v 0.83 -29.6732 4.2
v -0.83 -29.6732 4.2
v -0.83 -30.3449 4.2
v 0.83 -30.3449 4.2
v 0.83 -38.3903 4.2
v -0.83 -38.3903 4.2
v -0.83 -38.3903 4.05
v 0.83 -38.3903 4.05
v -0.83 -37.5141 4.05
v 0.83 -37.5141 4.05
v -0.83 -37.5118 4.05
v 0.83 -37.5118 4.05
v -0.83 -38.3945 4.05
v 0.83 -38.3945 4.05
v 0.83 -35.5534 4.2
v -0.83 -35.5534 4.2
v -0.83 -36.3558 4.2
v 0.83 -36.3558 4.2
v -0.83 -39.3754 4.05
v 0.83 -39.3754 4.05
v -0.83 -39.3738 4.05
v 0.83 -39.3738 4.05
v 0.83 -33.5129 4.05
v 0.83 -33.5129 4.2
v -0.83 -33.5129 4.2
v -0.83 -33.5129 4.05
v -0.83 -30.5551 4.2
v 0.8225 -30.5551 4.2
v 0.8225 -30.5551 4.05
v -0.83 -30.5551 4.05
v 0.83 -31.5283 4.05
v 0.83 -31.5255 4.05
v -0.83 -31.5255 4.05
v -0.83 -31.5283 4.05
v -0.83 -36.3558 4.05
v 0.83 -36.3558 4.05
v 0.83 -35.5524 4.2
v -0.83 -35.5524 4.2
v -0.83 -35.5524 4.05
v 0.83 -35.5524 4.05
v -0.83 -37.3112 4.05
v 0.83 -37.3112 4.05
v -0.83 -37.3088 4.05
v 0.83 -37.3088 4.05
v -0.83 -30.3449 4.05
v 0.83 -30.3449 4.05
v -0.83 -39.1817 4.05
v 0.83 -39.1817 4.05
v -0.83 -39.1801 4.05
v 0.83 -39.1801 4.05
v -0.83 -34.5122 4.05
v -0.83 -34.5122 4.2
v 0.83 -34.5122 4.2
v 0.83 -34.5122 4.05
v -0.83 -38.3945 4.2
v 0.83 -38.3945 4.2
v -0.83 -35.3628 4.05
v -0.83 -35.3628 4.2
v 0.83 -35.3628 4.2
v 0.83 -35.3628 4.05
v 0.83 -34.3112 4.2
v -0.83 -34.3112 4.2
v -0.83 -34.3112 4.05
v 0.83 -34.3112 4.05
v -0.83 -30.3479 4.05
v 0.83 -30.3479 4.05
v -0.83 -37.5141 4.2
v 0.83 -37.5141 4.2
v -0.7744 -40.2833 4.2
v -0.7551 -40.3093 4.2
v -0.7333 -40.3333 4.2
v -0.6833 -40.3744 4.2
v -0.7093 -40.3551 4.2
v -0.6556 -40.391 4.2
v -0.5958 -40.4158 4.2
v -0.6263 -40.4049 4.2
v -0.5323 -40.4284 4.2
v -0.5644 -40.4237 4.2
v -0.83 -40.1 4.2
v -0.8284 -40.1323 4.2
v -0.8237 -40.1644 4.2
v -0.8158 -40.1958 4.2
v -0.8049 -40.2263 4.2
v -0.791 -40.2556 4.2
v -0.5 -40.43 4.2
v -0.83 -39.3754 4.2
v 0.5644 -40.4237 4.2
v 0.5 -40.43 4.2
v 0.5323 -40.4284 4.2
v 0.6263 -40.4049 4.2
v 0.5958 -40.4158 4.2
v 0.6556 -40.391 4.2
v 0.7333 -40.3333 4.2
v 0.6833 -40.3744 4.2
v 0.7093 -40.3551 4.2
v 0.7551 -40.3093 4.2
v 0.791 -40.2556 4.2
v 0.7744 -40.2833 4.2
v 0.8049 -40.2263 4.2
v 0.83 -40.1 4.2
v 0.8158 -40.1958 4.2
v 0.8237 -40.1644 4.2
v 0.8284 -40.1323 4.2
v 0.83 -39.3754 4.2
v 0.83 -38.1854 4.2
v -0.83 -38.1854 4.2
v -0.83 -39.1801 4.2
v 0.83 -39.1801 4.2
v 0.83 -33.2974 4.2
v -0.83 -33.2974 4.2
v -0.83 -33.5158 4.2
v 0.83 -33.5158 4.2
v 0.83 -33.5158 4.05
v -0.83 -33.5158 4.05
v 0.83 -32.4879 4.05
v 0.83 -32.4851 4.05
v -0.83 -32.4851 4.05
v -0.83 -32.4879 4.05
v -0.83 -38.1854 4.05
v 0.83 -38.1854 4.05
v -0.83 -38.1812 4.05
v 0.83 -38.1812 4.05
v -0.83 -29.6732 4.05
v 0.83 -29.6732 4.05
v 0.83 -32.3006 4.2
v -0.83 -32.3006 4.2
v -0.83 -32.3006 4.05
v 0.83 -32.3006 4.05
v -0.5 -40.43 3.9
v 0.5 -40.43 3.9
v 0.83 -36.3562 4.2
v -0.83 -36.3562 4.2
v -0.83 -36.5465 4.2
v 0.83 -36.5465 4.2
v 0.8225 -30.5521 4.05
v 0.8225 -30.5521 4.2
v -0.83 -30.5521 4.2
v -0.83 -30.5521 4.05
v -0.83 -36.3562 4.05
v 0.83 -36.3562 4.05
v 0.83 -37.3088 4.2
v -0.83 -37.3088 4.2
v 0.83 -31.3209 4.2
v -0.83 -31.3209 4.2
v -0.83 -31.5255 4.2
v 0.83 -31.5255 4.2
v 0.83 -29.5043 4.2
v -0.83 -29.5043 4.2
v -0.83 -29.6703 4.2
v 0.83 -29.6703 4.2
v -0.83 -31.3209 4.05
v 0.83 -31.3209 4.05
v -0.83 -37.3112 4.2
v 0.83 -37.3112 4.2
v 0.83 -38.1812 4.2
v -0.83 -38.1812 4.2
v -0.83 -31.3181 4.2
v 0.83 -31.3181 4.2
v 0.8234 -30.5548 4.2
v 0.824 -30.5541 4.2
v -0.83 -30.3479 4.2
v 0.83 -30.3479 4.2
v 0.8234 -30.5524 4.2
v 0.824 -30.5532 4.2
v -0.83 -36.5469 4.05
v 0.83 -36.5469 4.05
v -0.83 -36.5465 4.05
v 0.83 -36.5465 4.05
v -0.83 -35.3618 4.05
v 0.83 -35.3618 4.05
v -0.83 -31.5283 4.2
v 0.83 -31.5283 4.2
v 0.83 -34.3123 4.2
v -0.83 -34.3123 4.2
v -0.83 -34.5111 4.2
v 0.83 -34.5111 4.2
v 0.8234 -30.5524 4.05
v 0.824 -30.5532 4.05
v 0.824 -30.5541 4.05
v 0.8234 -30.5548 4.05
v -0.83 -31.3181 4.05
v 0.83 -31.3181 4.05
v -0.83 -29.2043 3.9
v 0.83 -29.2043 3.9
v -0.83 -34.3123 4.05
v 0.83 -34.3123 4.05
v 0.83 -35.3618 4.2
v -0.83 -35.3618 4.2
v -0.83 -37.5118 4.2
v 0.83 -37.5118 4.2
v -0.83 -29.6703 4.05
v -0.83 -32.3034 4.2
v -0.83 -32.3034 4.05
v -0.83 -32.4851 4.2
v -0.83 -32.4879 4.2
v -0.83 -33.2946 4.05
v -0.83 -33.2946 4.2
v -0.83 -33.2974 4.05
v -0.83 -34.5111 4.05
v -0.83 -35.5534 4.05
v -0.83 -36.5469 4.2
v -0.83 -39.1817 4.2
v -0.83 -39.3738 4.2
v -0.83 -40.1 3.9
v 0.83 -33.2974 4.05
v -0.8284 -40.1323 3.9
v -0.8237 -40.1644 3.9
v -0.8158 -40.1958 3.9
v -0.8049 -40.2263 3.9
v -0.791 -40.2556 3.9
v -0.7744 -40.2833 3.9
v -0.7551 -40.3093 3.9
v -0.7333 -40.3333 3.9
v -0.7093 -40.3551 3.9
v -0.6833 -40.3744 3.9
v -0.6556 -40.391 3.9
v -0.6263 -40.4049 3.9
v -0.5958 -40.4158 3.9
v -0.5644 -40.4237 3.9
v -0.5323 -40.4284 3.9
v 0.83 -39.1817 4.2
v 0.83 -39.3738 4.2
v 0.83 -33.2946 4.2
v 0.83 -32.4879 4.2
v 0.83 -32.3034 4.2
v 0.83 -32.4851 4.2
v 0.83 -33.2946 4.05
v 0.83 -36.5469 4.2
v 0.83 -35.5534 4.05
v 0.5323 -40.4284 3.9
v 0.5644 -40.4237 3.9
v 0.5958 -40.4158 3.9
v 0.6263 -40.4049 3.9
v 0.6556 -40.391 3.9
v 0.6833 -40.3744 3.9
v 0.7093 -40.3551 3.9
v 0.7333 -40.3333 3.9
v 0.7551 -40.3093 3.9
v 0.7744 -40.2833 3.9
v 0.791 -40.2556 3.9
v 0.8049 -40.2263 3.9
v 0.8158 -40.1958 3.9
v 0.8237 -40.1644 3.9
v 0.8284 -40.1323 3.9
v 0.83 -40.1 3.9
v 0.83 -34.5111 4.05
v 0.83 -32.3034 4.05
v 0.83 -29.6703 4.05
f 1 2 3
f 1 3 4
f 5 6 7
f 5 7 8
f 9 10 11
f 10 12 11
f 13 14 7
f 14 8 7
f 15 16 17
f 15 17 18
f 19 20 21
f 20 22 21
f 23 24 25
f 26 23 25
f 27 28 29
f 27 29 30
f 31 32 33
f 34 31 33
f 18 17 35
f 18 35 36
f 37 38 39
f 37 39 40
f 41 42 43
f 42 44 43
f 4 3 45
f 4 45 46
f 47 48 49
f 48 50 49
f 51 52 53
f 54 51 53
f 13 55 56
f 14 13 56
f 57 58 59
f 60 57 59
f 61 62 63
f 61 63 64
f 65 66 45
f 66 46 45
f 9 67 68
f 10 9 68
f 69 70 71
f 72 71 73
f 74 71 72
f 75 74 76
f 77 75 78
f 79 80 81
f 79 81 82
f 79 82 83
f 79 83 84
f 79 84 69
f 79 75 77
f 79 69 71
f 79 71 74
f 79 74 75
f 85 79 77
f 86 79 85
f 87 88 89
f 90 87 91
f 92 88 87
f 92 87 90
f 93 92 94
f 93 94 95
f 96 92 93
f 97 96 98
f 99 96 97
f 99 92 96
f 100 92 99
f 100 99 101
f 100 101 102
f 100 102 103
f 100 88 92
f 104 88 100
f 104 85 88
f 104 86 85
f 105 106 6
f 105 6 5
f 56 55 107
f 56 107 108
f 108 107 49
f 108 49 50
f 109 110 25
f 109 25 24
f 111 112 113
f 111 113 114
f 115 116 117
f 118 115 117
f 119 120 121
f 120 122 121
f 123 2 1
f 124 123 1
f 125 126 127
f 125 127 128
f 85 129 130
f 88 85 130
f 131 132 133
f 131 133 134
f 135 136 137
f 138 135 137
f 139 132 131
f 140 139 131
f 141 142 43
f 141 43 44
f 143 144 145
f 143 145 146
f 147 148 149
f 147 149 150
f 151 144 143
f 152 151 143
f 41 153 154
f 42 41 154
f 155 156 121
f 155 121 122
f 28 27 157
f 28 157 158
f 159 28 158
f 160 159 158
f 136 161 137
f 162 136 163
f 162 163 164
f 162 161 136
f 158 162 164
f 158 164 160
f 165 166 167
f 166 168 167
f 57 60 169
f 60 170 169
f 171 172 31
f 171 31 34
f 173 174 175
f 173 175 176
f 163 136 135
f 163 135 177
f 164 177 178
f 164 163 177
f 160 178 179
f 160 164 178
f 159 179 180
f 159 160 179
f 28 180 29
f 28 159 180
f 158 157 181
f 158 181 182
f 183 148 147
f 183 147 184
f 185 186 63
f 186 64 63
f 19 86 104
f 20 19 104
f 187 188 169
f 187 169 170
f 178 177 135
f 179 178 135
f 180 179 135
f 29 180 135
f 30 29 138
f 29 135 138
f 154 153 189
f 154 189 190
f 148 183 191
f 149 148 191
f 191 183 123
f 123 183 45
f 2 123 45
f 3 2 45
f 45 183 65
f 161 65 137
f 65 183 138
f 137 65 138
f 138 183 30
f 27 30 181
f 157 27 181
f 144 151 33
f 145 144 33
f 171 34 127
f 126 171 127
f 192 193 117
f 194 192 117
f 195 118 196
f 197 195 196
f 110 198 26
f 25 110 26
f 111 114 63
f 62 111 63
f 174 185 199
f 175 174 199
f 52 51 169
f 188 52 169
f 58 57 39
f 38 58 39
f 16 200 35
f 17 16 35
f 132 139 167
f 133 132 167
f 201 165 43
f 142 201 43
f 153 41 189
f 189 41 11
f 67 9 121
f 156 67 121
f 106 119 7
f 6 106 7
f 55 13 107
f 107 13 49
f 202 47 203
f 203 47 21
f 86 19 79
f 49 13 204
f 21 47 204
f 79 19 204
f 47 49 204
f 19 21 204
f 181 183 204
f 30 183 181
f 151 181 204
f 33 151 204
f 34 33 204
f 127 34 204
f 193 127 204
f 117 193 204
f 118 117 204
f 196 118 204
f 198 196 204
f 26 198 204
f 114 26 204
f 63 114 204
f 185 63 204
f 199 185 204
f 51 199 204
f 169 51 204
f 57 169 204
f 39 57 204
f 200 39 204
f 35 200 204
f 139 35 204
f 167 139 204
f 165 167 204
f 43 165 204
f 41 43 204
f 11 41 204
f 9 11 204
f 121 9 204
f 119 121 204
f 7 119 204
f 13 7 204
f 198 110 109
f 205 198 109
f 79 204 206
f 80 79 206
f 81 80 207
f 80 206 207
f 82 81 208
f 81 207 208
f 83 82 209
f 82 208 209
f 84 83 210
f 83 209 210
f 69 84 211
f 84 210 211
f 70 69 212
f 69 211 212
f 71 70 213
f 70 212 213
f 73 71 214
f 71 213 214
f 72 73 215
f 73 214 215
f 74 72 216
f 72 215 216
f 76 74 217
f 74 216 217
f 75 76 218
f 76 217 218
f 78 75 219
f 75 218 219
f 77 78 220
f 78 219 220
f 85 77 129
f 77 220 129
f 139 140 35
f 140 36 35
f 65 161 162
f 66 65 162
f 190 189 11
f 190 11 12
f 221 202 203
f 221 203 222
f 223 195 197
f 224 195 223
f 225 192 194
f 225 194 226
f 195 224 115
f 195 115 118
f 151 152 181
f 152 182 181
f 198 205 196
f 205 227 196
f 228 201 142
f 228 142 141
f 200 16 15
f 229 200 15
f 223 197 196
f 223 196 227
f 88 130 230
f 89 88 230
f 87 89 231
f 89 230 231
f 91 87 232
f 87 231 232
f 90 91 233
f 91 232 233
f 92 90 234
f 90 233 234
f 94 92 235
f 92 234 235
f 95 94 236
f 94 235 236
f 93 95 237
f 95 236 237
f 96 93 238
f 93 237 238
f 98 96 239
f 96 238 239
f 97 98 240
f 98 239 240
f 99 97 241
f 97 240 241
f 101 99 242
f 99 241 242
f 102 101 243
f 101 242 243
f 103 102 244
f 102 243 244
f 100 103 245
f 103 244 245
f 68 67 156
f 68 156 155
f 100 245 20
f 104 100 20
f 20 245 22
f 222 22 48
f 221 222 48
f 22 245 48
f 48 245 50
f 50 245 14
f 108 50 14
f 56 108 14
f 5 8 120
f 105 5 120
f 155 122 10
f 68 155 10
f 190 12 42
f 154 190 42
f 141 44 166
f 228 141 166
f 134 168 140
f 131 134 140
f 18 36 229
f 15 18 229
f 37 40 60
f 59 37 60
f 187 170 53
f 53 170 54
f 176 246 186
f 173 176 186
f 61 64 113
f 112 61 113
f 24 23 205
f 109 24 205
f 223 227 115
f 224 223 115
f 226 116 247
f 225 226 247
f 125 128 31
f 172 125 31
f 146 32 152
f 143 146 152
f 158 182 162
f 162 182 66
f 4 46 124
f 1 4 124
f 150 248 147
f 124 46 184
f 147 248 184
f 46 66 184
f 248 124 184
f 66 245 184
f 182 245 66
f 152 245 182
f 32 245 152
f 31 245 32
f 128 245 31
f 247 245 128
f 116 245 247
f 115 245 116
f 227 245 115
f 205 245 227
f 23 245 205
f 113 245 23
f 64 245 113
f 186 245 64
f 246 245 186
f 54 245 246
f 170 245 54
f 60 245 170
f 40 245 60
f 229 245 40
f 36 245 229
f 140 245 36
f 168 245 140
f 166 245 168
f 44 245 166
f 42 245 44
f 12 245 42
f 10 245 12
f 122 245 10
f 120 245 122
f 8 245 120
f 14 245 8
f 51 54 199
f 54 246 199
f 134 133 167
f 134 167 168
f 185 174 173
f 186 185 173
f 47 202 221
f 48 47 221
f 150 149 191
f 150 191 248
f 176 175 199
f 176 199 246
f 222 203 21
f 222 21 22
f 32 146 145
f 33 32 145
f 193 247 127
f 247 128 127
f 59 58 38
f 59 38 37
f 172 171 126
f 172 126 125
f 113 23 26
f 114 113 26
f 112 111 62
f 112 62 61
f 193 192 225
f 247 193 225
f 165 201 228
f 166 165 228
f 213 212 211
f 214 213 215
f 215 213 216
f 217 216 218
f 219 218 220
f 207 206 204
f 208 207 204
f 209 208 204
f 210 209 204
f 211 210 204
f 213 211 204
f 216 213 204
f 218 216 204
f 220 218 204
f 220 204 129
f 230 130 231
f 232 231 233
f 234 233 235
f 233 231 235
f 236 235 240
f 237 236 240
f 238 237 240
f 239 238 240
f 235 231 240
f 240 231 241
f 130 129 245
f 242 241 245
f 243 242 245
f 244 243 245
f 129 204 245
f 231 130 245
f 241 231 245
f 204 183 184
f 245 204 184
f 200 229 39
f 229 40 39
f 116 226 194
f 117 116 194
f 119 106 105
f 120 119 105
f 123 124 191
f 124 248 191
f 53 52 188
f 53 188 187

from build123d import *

# Parameters (mm, degrees)
PAD005_DEPTH    = 0.3
POCKET019_DEPTH = 5
POCKET021_DEPTH = 0.15


with BuildPart() as part:
    # Sketch022 (on Face1 of Binder004) → Pad005 (new body)
    with BuildSketch(Plane.XY.offset(3.9)):
        with BuildLine():
            Line((-0.83, -29.124264), (-0.83, -40.1))
            ThreePointArc((-0.83, -40.1), (-0.733345, -40.333345), (-0.5, -40.43))
            Line((-0.5, -40.43), (0.5, -40.43))
            ThreePointArc((0.5, -40.43), (0.733345, -40.333345), (0.83, -40.1))
            Line((0.83, -40.1), (0.83, -29.124264))
            Line((0.83, -29.124264), (-0.83, -29.124264))
        make_face()
    extrude(amount=PAD005_DEPTH)

    # Sketch023 (on Face1 of Pad005) → Pocket019 (cut)
    with BuildSketch(Plane(origin=(-0.83, 0, 0), x_dir=(0, -1, 0), z_dir=(-1, 0, 0))):
        Polygon((29.124264, 4.2), (29.504264, 4.2), (29.204264, 3.9), (29.124264, 3.9), align=None)
    extrude(amount=-POCKET019_DEPTH, mode=Mode.SUBTRACT)

    # Sketch025 (on Face4 of Pocket019) → Pocket021 (cut)
    with BuildSketch(Plane.XY.offset(4.2)):
        with BuildLine():
            ThreePointArc((-0.83, -29.67322), (-0.831482, -29.671738), (-0.83, -29.670256))
            Line((-0.83, -29.670256), (-0.276667, -29.670256))
            Line((-0.276667, -29.670256), (0.83, -29.670256))
            ThreePointArc((0.83, -29.670256), (0.831482, -29.671738), (0.83, -29.67322))
            Line((-0.276667, -29.67322), (0.83, -29.67322))
            Line((-0.83, -29.67322), (-0.276667, -29.67322))
        make_face()
        with BuildLine():
            ThreePointArc((0.822545, -30.552135), (0.824027, -30.553617), (0.822545, -30.555099))
            Line((0.822545, -30.555099), (0.271697, -30.555099))
            Line((0.271697, -30.555099), (-0.83, -30.555099))
            ThreePointArc((-0.83, -30.555099), (-0.831482, -30.553617), (-0.83, -30.552135))
            Line((0.271697, -30.552135), (-0.83, -30.552135))
            Line((0.822545, -30.552135), (0.271697, -30.552135))
        make_face()
        with BuildLine():
            ThreePointArc((-0.83, -30.347855), (-0.831482, -30.346373), (-0.83, -30.344891))
            Line((-0.83, -30.344891), (-0.276667, -30.344891))
            Line((-0.276667, -30.344891), (0.83, -30.344891))
            ThreePointArc((0.83, -30.344891), (0.831482, -30.346373), (0.83, -30.347855))
            Line((-0.276667, -30.347855), (0.83, -30.347855))
            Line((-0.83, -30.347855), (-0.276667, -30.347855))
        make_face()
        with BuildLine():
            ThreePointArc((-0.83, -31.320874), (-0.831408, -31.319466), (-0.83, -31.318058))
            Line((-0.83, -31.318058), (-0.276667, -31.318058))
            Line((-0.276667, -31.318058), (0.83, -31.318058))
            ThreePointArc((0.83, -31.318058), (0.831408, -31.319466), (0.83, -31.320874))
            Line((-0.276667, -31.320874), (0.83, -31.320874))
            Line((-0.83, -31.320874), (-0.276667, -31.320874))
        make_face()
        with BuildLine():
            ThreePointArc((0.83, -33.512935), (0.831408, -33.514343), (0.83, -33.515751))
            Line((0.83, -33.515751), (0.276667, -33.515751))
            Line((0.276667, -33.515751), (-0.83, -33.515751))
            ThreePointArc((-0.83, -33.515751), (-0.831408, -33.514343), (-0.83, -33.512935))
            Line((0.276667, -33.512935), (-0.83, -33.512935))
            Line((0.83, -33.512935), (0.276667, -33.512935))
        make_face()
        with BuildLine():
            ThreePointArc((-0.83, -33.297432), (-0.831408, -33.296024), (-0.83, -33.294616))
            Line((-0.83, -33.294616), (-0.276667, -33.294616))
            Line((-0.276667, -33.294616), (0.83, -33.294616))
            ThreePointArc((0.83, -33.294616), (0.831408, -33.296024), (0.83, -33.297432))
            Line((-0.276667, -33.297432), (0.83, -33.297432))
            Line((-0.83, -33.297432), (-0.276667, -33.297432))
        make_face()
        with BuildLine():
            ThreePointArc((0.83, -32.485115), (0.831408, -32.486523), (0.83, -32.487931))
            Line((0.83, -32.487931), (0.276667, -32.487931))
            Line((0.276667, -32.487931), (-0.83, -32.487931))
            ThreePointArc((-0.83, -32.487931), (-0.831408, -32.486523), (-0.83, -32.485115))
            Line((0.276667, -32.485115), (-0.83, -32.485115))
            Line((0.83, -32.485115), (0.276667, -32.485115))
        make_face()
        with BuildLine():
            ThreePointArc((-0.83, -32.30344), (-0.831408, -32.302032), (-0.83, -32.300624))
            Line((-0.83, -32.300624), (-0.276667, -32.300624))
            Line((-0.276667, -32.300624), (0.83, -32.300624))
            ThreePointArc((0.83, -32.300624), (0.831408, -32.302032), (0.83, -32.30344))
            Line((-0.276667, -32.30344), (0.83, -32.30344))
            Line((-0.83, -32.30344), (-0.276667, -32.30344))
        make_face()
        with BuildLine():
            ThreePointArc((0.83, -31.525518), (0.831408, -31.526926), (0.83, -31.528334))
            Line((0.83, -31.528334), (0.276667, -31.528334))
            Line((0.276667, -31.528334), (-0.83, -31.528334))
            ThreePointArc((-0.83, -31.528334), (-0.831408, -31.526926), (-0.83, -31.525518))
            Line((0.276667, -31.525518), (-0.83, -31.525518))
            Line((0.83, -31.525518), (0.276667, -31.525518))
        make_face()
        with BuildLine():
            ThreePointArc((-0.83, -34.312305), (-0.830534, -34.311771), (-0.83, -34.311237))
            Line((-0.83, -34.311237), (-0.276667, -34.311237))
            Line((-0.276667, -34.311237), (0.83, -34.311237))
            ThreePointArc((0.83, -34.311237), (0.830534, -34.311771), (0.83, -34.312305))
            Line((-0.276667, -34.312305), (0.83, -34.312305))
            Line((-0.83, -34.312305), (-0.276667, -34.312305))
        make_face()
        with BuildLine():
            ThreePointArc((-0.83, -34.512173), (-0.830534, -34.511639), (-0.83, -34.511105))
            Line((-0.83, -34.511105), (-0.276667, -34.511105))
            Line((-0.276667, -34.511105), (0.83, -34.511105))
            ThreePointArc((0.83, -34.511105), (0.830534, -34.511639), (0.83, -34.512173))
            Line((-0.276667, -34.512173), (0.83, -34.512173))
            Line((-0.83, -34.512173), (-0.276667, -34.512173))
        make_face()
        with BuildLine():
            ThreePointArc((-0.83, -35.362793), (-0.830515, -35.362278), (-0.83, -35.361763))
            Line((-0.83, -35.361763), (-0.276667, -35.361763))
            Line((-0.276667, -35.361763), (0.83, -35.361763))
            ThreePointArc((0.83, -35.361763), (0.830515, -35.362278), (0.83, -35.362793))
            Line((-0.276667, -35.362793), (0.83, -35.362793))
            Line((-0.83, -35.362793), (-0.276667, -35.362793))
        make_face()
        with BuildLine():
            ThreePointArc((-0.83, -35.553436), (-0.830515, -35.552921), (-0.83, -35.552406))
            Line((-0.83, -35.552406), (-0.276667, -35.552406))
            Line((-0.276667, -35.552406), (0.83, -35.552406))
            ThreePointArc((0.83, -35.552406), (0.830515, -35.552921), (0.83, -35.553436))
            Line((-0.276667, -35.553436), (0.83, -35.553436))
            Line((-0.83, -35.553436), (-0.276667, -35.553436))
        make_face()
        with BuildLine():
            ThreePointArc((-0.83, -36.356216), (-0.830198, -36.356018), (-0.83, -36.35582))
            Line((-0.83, -36.35582), (-0.276667, -36.35582))
            Line((-0.276667, -36.35582), (0.83, -36.35582))
            ThreePointArc((0.83, -36.35582), (0.830198, -36.356018), (0.83, -36.356216))
            Line((-0.276667, -36.356216), (0.83, -36.356216))
            Line((-0.83, -36.356216), (-0.276667, -36.356216))
        make_face()
        with BuildLine():
            ThreePointArc((-0.83, -36.546859), (-0.830198, -36.546661), (-0.83, -36.546463))
            Line((-0.83, -36.546463), (-0.276667, -36.546463))
            Line((-0.276667, -36.546463), (0.83, -36.546463))
            ThreePointArc((0.83, -36.546463), (0.830198, -36.546661), (0.83, -36.546859))
            Line((-0.276667, -36.546859), (0.83, -36.546859))
            Line((-0.83, -36.546859), (-0.276667, -36.546859))
        make_face()
        with BuildLine():
            ThreePointArc((-0.83, -37.311195), (-0.831175, -37.31002), (-0.83, -37.308845))
            Line((-0.83, -37.308845), (-0.276667, -37.308845))
            Line((-0.276667, -37.308845), (0.83, -37.308845))
            ThreePointArc((0.83, -37.308845), (0.831175, -37.31002), (0.83, -37.311195))
            Line((-0.276667, -37.311195), (0.83, -37.311195))
            Line((-0.83, -37.311195), (-0.276667, -37.311195))
        make_face()
        with BuildLine():
            ThreePointArc((-0.83, -37.514137), (-0.831175, -37.512962), (-0.83, -37.511787))
            Line((-0.83, -37.511787), (-0.276667, -37.511787))
            Line((-0.276667, -37.511787), (0.83, -37.511787))
            ThreePointArc((0.83, -37.511787), (0.831175, -37.512962), (0.83, -37.514137))
            Line((-0.276667, -37.514137), (0.83, -37.514137))
            Line((-0.83, -37.514137), (-0.276667, -37.514137))
        make_face()
        with BuildLine():
            ThreePointArc((-0.83, -38.185368), (-0.832079, -38.183289), (-0.83, -38.18121))
            Line((-0.83, -38.18121), (-0.276667, -38.18121))
            Line((-0.276667, -38.18121), (0.83, -38.18121))
            ThreePointArc((0.83, -38.18121), (0.832079, -38.183289), (0.83, -38.185368))
            Line((-0.276667, -38.185368), (0.83, -38.185368))
            Line((-0.83, -38.185368), (-0.276667, -38.185368))
        make_face()
        with BuildLine():
            ThreePointArc((-0.83, -38.394459), (-0.832079, -38.39238), (-0.83, -38.390301))
            Line((-0.83, -38.390301), (-0.276667, -38.390301))
            Line((-0.276667, -38.390301), (0.83, -38.390301))
            ThreePointArc((0.83, -38.390301), (0.832079, -38.39238), (0.83, -38.394459))
            Line((-0.276667, -38.394459), (0.83, -38.394459))
            Line((-0.83, -38.394459), (-0.276667, -38.394459))
        make_face()
        with BuildLine():
            ThreePointArc((-0.83, -39.181679), (-0.830775, -39.180904), (-0.83, -39.180129))
            Line((-0.83, -39.180129), (-0.276667, -39.180129))
            Line((-0.276667, -39.180129), (0.83, -39.180129))
            ThreePointArc((0.83, -39.180129), (0.830775, -39.180904), (0.83, -39.181679))
            Line((-0.276667, -39.181679), (0.83, -39.181679))
            Line((-0.83, -39.181679), (-0.276667, -39.181679))
        make_face()
        with BuildLine():
            ThreePointArc((-0.83, -39.375397), (-0.830775, -39.374622), (-0.83, -39.373847))
            Line((-0.83, -39.373847), (-0.276667, -39.373847))
            Line((-0.276667, -39.373847), (0.83, -39.373847))
            ThreePointArc((0.83, -39.373847), (0.830775, -39.374622), (0.83, -39.375397))
            Line((-0.276667, -39.375397), (0.83, -39.375397))
            Line((-0.83, -39.375397), (-0.276667, -39.375397))
        make_face()
    extrude(amount=-POCKET021_DEPTH, mode=Mode.SUBTRACT)


solid = part.part
